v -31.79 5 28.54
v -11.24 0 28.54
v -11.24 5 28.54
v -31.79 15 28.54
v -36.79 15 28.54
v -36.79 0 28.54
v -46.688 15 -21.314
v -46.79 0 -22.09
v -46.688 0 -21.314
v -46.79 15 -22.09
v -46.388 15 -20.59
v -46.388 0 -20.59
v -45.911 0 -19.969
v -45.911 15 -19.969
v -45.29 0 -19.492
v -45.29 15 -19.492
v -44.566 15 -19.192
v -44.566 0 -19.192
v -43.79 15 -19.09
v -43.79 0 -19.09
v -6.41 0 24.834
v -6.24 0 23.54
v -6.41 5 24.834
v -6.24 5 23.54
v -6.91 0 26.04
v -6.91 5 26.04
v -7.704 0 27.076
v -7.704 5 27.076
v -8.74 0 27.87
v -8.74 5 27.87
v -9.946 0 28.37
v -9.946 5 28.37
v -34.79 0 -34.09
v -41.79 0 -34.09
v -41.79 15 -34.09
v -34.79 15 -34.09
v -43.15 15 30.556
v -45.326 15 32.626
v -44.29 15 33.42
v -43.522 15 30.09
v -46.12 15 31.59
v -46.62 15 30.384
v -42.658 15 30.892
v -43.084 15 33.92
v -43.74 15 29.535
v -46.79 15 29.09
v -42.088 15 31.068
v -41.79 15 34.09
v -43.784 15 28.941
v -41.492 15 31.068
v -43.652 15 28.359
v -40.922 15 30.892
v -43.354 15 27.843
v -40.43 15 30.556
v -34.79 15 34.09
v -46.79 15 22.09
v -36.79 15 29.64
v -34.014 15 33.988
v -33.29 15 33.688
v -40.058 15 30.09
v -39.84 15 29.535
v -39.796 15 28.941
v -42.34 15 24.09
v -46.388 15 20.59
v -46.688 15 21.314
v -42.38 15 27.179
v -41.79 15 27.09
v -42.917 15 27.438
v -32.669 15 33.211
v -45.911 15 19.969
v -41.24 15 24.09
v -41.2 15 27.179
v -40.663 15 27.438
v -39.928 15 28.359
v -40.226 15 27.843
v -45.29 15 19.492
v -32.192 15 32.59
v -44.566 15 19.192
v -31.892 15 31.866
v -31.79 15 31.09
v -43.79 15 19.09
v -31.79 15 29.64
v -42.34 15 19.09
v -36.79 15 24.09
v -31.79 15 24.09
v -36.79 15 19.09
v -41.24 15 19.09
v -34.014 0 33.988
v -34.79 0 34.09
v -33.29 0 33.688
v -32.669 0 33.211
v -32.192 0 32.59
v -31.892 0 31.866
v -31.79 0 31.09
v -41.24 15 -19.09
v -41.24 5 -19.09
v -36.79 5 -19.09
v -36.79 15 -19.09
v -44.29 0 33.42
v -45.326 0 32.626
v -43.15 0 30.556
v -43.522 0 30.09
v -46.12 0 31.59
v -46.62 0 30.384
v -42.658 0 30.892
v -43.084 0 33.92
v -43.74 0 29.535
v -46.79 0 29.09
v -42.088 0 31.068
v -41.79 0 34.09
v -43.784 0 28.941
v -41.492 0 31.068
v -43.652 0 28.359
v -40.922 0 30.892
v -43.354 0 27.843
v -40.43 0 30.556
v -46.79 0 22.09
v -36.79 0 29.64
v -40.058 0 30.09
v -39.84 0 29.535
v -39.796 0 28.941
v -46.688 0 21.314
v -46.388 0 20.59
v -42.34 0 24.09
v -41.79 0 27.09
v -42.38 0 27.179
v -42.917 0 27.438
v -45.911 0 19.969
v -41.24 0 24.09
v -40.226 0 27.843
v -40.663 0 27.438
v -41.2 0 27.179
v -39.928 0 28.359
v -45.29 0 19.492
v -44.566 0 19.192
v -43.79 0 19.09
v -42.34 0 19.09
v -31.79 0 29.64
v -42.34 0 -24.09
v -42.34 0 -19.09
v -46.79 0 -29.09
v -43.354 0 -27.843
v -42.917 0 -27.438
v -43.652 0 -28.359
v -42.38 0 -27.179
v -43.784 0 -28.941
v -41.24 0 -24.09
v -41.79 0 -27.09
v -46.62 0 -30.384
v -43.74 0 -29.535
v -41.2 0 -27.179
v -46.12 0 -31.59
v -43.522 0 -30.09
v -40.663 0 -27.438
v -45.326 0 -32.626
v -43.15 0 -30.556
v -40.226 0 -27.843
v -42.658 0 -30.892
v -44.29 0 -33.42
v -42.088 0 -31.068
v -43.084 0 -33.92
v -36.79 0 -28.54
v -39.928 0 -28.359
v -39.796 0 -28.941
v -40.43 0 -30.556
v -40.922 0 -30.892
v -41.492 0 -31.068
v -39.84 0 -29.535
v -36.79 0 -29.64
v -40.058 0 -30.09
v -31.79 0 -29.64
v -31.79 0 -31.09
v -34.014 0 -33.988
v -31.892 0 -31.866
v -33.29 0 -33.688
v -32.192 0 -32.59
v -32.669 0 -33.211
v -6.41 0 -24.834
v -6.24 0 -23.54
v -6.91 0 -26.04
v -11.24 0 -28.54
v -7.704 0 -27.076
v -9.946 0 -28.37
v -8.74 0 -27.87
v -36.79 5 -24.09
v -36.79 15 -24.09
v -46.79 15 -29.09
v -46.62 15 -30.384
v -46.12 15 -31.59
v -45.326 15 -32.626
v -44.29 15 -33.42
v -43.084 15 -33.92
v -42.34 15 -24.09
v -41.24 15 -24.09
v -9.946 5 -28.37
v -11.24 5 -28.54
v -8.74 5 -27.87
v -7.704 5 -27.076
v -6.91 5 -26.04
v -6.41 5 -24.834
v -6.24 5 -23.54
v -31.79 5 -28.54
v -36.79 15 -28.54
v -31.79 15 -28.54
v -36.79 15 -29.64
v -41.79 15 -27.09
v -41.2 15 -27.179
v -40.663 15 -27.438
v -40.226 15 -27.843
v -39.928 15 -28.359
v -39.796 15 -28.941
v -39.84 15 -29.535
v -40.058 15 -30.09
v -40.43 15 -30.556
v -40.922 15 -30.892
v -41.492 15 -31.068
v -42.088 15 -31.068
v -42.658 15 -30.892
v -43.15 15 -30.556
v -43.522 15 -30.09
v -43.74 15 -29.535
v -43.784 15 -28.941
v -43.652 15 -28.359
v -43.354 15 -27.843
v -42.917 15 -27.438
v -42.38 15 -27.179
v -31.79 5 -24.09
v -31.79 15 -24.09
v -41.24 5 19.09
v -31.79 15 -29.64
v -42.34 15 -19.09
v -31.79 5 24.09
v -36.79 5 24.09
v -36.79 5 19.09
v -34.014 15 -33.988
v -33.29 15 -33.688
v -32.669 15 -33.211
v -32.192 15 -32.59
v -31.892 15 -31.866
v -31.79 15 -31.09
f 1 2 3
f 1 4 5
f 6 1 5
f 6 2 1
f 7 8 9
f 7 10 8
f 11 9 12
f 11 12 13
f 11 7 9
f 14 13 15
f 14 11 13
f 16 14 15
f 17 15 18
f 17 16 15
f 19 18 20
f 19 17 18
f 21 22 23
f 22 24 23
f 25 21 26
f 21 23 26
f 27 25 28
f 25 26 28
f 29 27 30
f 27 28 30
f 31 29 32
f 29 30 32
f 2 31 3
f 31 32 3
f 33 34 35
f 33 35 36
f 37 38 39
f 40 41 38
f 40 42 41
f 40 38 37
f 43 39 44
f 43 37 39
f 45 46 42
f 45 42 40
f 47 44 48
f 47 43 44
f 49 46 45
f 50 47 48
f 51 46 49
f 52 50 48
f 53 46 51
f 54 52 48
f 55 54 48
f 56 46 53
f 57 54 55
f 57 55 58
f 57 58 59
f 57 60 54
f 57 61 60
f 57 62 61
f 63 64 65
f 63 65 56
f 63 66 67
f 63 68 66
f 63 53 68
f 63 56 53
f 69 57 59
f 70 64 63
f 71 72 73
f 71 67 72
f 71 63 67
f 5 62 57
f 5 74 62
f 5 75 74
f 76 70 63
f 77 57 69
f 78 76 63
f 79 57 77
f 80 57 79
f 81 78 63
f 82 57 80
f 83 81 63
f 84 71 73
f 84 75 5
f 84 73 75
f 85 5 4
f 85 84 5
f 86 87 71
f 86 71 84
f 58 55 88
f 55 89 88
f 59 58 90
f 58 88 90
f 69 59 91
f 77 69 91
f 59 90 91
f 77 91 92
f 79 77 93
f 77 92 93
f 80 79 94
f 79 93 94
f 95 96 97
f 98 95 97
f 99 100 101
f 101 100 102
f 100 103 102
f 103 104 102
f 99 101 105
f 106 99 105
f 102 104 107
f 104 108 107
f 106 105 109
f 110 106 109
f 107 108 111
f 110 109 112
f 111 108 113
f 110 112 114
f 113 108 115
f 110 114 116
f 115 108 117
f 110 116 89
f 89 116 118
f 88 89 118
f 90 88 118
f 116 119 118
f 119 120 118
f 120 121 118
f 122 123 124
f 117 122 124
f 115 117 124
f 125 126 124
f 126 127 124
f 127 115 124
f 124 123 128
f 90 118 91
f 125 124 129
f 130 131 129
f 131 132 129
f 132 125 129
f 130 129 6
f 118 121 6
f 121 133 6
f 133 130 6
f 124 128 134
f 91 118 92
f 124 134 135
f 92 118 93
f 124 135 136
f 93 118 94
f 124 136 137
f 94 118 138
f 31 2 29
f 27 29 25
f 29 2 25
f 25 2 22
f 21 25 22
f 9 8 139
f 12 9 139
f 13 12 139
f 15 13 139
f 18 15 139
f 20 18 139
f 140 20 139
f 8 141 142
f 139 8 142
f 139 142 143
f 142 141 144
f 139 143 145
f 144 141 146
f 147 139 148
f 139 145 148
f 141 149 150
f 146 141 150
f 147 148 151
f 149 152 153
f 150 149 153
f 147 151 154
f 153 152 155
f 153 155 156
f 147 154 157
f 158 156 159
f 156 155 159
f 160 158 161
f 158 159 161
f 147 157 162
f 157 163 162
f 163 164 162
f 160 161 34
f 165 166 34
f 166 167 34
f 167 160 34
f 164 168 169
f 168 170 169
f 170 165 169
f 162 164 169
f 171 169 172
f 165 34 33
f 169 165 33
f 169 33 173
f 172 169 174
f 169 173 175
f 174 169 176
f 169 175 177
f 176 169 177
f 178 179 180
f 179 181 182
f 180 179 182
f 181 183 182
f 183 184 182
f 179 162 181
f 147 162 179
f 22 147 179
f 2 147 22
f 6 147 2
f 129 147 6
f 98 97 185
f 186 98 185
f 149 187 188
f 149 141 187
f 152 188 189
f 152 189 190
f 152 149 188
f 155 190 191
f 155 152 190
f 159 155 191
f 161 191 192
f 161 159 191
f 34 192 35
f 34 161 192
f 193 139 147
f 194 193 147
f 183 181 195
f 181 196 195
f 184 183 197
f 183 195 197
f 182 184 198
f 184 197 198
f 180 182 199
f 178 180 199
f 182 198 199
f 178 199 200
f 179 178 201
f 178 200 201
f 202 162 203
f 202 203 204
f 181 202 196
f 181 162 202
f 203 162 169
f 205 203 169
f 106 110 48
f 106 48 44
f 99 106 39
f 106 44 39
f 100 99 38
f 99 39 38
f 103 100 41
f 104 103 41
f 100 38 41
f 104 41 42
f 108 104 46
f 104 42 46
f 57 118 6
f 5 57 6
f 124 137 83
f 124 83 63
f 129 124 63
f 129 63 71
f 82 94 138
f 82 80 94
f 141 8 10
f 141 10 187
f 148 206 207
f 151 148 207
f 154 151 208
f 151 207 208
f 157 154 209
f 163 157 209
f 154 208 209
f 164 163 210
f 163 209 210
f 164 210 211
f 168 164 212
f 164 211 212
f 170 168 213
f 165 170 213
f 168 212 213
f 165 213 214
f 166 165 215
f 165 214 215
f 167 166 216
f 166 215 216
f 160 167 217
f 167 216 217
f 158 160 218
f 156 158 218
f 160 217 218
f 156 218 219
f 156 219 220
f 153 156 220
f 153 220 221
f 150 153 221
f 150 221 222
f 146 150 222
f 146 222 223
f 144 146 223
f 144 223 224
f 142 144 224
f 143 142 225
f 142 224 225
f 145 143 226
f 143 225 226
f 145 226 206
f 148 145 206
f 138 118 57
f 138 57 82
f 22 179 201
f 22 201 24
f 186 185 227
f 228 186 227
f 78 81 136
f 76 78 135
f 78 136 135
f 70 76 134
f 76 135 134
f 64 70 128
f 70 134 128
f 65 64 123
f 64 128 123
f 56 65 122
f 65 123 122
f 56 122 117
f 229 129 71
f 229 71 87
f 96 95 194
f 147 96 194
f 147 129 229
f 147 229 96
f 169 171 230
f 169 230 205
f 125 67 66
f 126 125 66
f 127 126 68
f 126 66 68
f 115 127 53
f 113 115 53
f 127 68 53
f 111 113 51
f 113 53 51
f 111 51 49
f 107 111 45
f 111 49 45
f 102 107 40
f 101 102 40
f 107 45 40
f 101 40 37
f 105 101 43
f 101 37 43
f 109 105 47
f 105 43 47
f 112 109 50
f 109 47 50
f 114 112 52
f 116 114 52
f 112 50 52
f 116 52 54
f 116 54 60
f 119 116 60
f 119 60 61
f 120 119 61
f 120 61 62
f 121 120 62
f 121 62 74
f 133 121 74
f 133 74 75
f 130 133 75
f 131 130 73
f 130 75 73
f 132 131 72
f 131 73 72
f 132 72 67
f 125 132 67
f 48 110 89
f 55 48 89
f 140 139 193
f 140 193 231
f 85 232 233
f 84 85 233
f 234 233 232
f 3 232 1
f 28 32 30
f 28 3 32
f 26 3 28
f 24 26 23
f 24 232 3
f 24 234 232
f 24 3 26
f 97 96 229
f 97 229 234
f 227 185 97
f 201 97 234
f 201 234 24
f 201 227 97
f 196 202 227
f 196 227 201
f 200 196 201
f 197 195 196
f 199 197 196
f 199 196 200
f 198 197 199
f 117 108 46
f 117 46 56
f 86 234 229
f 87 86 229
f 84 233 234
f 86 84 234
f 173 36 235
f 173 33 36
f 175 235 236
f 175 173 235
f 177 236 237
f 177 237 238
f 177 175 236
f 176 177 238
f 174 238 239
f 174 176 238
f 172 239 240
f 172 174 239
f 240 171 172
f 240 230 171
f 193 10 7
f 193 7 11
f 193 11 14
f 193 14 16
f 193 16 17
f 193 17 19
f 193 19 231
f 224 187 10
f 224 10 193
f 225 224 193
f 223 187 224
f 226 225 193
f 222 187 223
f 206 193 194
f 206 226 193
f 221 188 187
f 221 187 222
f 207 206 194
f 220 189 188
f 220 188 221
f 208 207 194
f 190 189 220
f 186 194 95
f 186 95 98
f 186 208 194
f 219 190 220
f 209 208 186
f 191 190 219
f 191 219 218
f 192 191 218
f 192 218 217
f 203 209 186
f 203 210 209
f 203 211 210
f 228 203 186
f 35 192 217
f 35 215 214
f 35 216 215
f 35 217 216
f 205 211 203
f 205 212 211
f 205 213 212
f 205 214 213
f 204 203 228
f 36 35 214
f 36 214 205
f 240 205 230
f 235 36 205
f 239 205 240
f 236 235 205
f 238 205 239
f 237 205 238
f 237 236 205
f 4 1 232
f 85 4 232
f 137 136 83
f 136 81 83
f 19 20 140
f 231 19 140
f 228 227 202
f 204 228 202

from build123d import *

# Parameters (mm, degrees)
SKETCH2_W          = 93.58
SKETCH2_H          = 68.18
BASE_DEPTH         = 5
SKETCH2_7_W        = 4.45
SKETCH2_7_H        = 4.45
SKETCH2_7_H_2      = 5
SKETCH2_7_W_2      = 5
SKETCH2_7_H_3      = 1.1
SKETCH2_7_W_3      = 1.1
WALLS_DEPTH        = 15
SKETCH2_10_W       = 1.1
SKETCH2_10_H       = 5
SKETCH2_10_H_2     = 38.18
SKETCH2_10_W_2     = 5
SKETCH2_10_H_3     = 1.1
SKETCH2_10_W_3     = 63.58
ACRYLIC_CUT_DEPTH  = 60.803279174
SKETCH4_W          = 63.58
SKETCH4_H          = 4.45
SKETCH4_W_2        = 4.45
SKETCH4_H_2        = 38.18
CUT_EXTRUDE2_DEPTH = 5
SKETCH5_R          = 2.25
SCREW_HOLES_DEPTH  = 5
FILLET1_R          = 5
FILLET2_R          = 3
SKETCH8_R          = 2
CUT_EXTRUDE3_DEPTH = 15
SKETCH7_W          = 13.03
SKETCH7_H          = 57.08
SKETCH7_W_2        = 40
SKETCH7_H_2        = 68.18
TOP_CUT_DEPTH      = 60.803279174
FILLET4_R          = 5


with BuildPart() as part:
    # Sketch2 → Base (new body)
    with BuildSketch(Plane(origin=(0, 0, 0), x_dir=(1, 0, 0), z_dir=(0, 1, 0))):
        Rectangle(SKETCH2_W, SKETCH2_H)
    extrude(amount=BASE_DEPTH)

    # Sketch2<7> → Walls (add)
    with BuildSketch(Plane(origin=(0, 0, 0), x_dir=(1, 0, 0), z_dir=(0, 1, 0))):
        with Locations((-39.015, 26.315)):
            Rectangle(SKETCH2_7_W, SKETCH2_7_H)
        with Locations((-39.015, 21.59)):
            Rectangle(SKETCH2_7_W, SKETCH2_7_H_2)
        with Locations((-44.565, 21.59)):
            Rectangle(SKETCH2_7_W, SKETCH2_7_H_2)
        with Locations((-44.565, 26.315)):
            Rectangle(SKETCH2_7_W, SKETCH2_7_H)
        with Locations((-44.565, 31.865)):
            Rectangle(SKETCH2_7_W, SKETCH2_7_H)
        with Locations((-39.015, 31.865)):
            Rectangle(SKETCH2_7_W, SKETCH2_7_H)
        with Locations((-34.29, 31.865)):
            Rectangle(SKETCH2_7_W_2, SKETCH2_7_H)
        with Locations((-34.29, 26.315)):
            Rectangle(SKETCH2_7_W_2, SKETCH2_7_H)
        with Locations((-34.29, 29.09)):
            Rectangle(SKETCH2_7_W_2, SKETCH2_7_H_3)
        with Locations((-39.015, 29.09)):
            Rectangle(SKETCH2_7_W, SKETCH2_7_H_3)
        with Locations((-44.565, 29.09)):
            Rectangle(SKETCH2_7_W, SKETCH2_7_H_3)
        with Locations((-41.79, 31.865)):
            Rectangle(SKETCH2_7_W_3, SKETCH2_7_H)
        with Locations((-41.79, 26.315)):
            Rectangle(SKETCH2_7_W_3, SKETCH2_7_H)
        with Locations((-41.79, 29.09)):
            Rectangle(SKETCH2_7_W_3, SKETCH2_7_H_3)
        with Locations((-41.79, 21.59)):
            Rectangle(SKETCH2_7_W_3, SKETCH2_7_H_2)
        with Locations((-34.29, -26.315)):
            Rectangle(SKETCH2_7_W_2, SKETCH2_7_H)
        with Locations((-34.29, -31.865)):
            Rectangle(SKETCH2_7_W_2, SKETCH2_7_H)
        with Locations((-39.015, -31.865)):
            Rectangle(SKETCH2_7_W, SKETCH2_7_H)
        with Locations((-39.015, -26.315)):
            Rectangle(SKETCH2_7_W, SKETCH2_7_H)
        with Locations((-44.565, -26.315)):
            Rectangle(SKETCH2_7_W, SKETCH2_7_H)
        with Locations((-44.565, -31.865)):
            Rectangle(SKETCH2_7_W, SKETCH2_7_H)
        with Locations((-44.565, -29.09)):
            Rectangle(SKETCH2_7_W, SKETCH2_7_H_3)
        with Locations((-41.79, -31.865)):
            Rectangle(SKETCH2_7_W_3, SKETCH2_7_H)
        with Locations((-41.79, -29.09)):
            Rectangle(SKETCH2_7_W_3, SKETCH2_7_H_3)
        with Locations((-41.79, -26.315)):
            Rectangle(SKETCH2_7_W_3, SKETCH2_7_H)
        with Locations((-44.565, -21.59)):
            Rectangle(SKETCH2_7_W, SKETCH2_7_H_2)
        with Locations((-39.015, -21.59)):
            Rectangle(SKETCH2_7_W, SKETCH2_7_H_2)
        with Locations((-41.79, -21.59)):
            Rectangle(SKETCH2_7_W_3, SKETCH2_7_H_2)
        with Locations((-39.015, -29.09)):
            Rectangle(SKETCH2_7_W, SKETCH2_7_H_3)
        with Locations((-34.29, -29.09)):
            Rectangle(SKETCH2_7_W_2, SKETCH2_7_H_3)
        with Locations((39.015, -21.59)):
            Rectangle(SKETCH2_7_W, SKETCH2_7_H_2)
        with Locations((44.565, -21.59)):
            Rectangle(SKETCH2_7_W, SKETCH2_7_H_2)
        with Locations((44.565, -26.315)):
            Rectangle(SKETCH2_7_W, SKETCH2_7_H)
        with Locations((39.015, -26.315)):
            Rectangle(SKETCH2_7_W, SKETCH2_7_H)
        with Locations((34.29, -31.865)):
            Rectangle(SKETCH2_7_W_2, SKETCH2_7_H)
        with Locations((39.015, -31.865)):
            Rectangle(SKETCH2_7_W, SKETCH2_7_H)
        with Locations((44.565, -31.865)):
            Rectangle(SKETCH2_7_W, SKETCH2_7_H)
        with Locations((41.79, -31.865)):
            Rectangle(SKETCH2_7_W_3, SKETCH2_7_H)
        with Locations((44.565, -29.09)):
            Rectangle(SKETCH2_7_W, SKETCH2_7_H_3)
        with Locations((41.79, -26.315)):
            Rectangle(SKETCH2_7_W_3, SKETCH2_7_H)
        with Locations((41.79, -21.59)):
            Rectangle(SKETCH2_7_W_3, SKETCH2_7_H_2)
        with Locations((34.29, -26.315)):
            Rectangle(SKETCH2_7_W_2, SKETCH2_7_H)
        with Locations((34.29, -29.09)):
            Rectangle(SKETCH2_7_W_2, SKETCH2_7_H_3)
        with Locations((39.015, -29.09)):
            Rectangle(SKETCH2_7_W, SKETCH2_7_H_3)
        with Locations((41.79, -29.09)):
            Rectangle(SKETCH2_7_W_3, SKETCH2_7_H_3)
        with Locations((34.29, 26.315)):
            Rectangle(SKETCH2_7_W_2, SKETCH2_7_H)
        with Locations((34.29, 31.865)):
            Rectangle(SKETCH2_7_W_2, SKETCH2_7_H)
        with Locations((39.015, 31.865)):
            Rectangle(SKETCH2_7_W, SKETCH2_7_H)
        with Locations((39.015, 26.315)):
            Rectangle(SKETCH2_7_W, SKETCH2_7_H)
        with Locations((44.565, 26.315)):
            Rectangle(SKETCH2_7_W, SKETCH2_7_H)
        with Locations((44.565, 31.865)):
            Rectangle(SKETCH2_7_W, SKETCH2_7_H)
        with Locations((44.565, 21.59)):
            Rectangle(SKETCH2_7_W, SKETCH2_7_H_2)
        with Locations((39.015, 21.59)):
            Rectangle(SKETCH2_7_W, SKETCH2_7_H_2)
        with Locations((41.79, 21.59)):
            Rectangle(SKETCH2_7_W_3, SKETCH2_7_H_2)
        with Locations((41.79, 26.315)):
            Rectangle(SKETCH2_7_W_3, SKETCH2_7_H)
        with Locations((41.79, 31.865)):
            Rectangle(SKETCH2_7_W_3, SKETCH2_7_H)
        with Locations((44.565, 29.09)):
            Rectangle(SKETCH2_7_W, SKETCH2_7_H_3)
        with Locations((41.79, 29.09)):
            Rectangle(SKETCH2_7_W_3, SKETCH2_7_H_3)
        with Locations((39.015, 29.09)):
            Rectangle(SKETCH2_7_W, SKETCH2_7_H_3)
        with Locations((34.29, 29.09)):
            Rectangle(SKETCH2_7_W_2, SKETCH2_7_H_3)
    extrude(amount=WALLS_DEPTH)

    # Sketch2<10> → Acrylic Cut (cut, through all)
    with BuildSketch(Plane(origin=(0, 0, 0), x_dir=(1, 0, 0), z_dir=(0, 1, 0))):
        with Locations((41.79, -21.59)):
            Rectangle(SKETCH2_10_W, SKETCH2_10_H)
        with Locations((41.79, 0)):
            Rectangle(SKETCH2_10_W, SKETCH2_10_H_2)
        with Locations((34.29, -29.09)):
            Rectangle(SKETCH2_10_W_2, SKETCH2_10_H_3)
        with Locations((0, -29.09)):
            Rectangle(SKETCH2_10_W_3, SKETCH2_10_H_3)
        with Locations((41.79, 21.59)):
            Rectangle(SKETCH2_10_W, SKETCH2_10_H)
        with Locations((34.29, 29.09)):
            Rectangle(SKETCH2_10_W_2, SKETCH2_10_H_3)
        with Locations((0, 29.09)):
            Rectangle(SKETCH2_10_W_3, SKETCH2_10_H_3)
        with Locations((-34.29, 29.09)):
            Rectangle(SKETCH2_10_W_2, SKETCH2_10_H_3)
        with Locations((-41.79, 21.59)):
            Rectangle(SKETCH2_10_W, SKETCH2_10_H)
        with Locations((-41.79, 0)):
            Rectangle(SKETCH2_10_W, SKETCH2_10_H_2)
        with Locations((-41.79, -21.59)):
            Rectangle(SKETCH2_10_W, SKETCH2_10_H)
        with Locations((-34.29, -29.09)):
            Rectangle(SKETCH2_10_W_2, SKETCH2_10_H_3)
    extrude(amount=ACRYLIC_CUT_DEPTH, mode=Mode.SUBTRACT)

    # Sketch4 → Cut-Extrude2 (cut)
    with BuildSketch(Plane(origin=(0, 5, 0), x_dir=(1, 0, 0), z_dir=(0, 1, 0))):
        with Locations((0, -31.865)):
            Rectangle(SKETCH4_W, SKETCH4_H)
        with Locations((44.565, 0)):
            Rectangle(SKETCH4_W_2, SKETCH4_H_2)
        with Locations((0, 31.865)):
            Rectangle(SKETCH4_W, SKETCH4_H)
        with Locations((-44.565, 0)):
            Rectangle(SKETCH4_W_2, SKETCH4_H_2)
    extrude(amount=-CUT_EXTRUDE2_DEPTH, mode=Mode.SUBTRACT)

    # Sketch5 → Screw Holes (add)
    with BuildSketch(Plane(origin=(0, 5, 0), x_dir=(1, 0, 0), z_dir=(0, 1, 0))):
        with Locations(Location((36.79, -10.16, 0), (0, 0, 90))):
            Circle(SKETCH5_R)
        with Locations(Location((16.79, -10.16, 0), (0, 0, 90))):
            Circle(SKETCH5_R)
        with Locations(Location((26.79, 19.64, 0), (0, 0, 90))):
            Circle(SKETCH5_R)
    extrude(amount=SCREW_HOLES_DEPTH)

    # Fillet1
    fillet1_edges = [part.edges().sort_by_distance(p)[0] for p in [
        (-46.79, 7.5, 34.09),
        (46.79, 7.5, 34.09),
        (46.79, 7.5, -34.09),
        (-46.79, 7.5, -34.09),
    ]]
    fillet(fillet1_edges, radius=FILLET1_R)

    # Fillet2
    fillet2_edges = [part.edges().sort_by_distance(p)[0] for p in [
        (31.79, 7.5, -34.09),
        (46.79, 7.5, -19.09),
        (-46.79, 7.5, -19.09),
        (-31.79, 7.5, -34.09),
        (-46.79, 7.5, 19.09),
        (-31.79, 7.5, 34.09),
        (31.79, 7.5, 34.09),
        (46.79, 7.5, 19.09),
    ]]
    fillet(fillet2_edges, radius=FILLET2_R)

    # Sketch8 → Cut-Extrude3 (cut)
    with BuildSketch(Plane(origin=(0, 15, 0), x_dir=(1, 0, 0), z_dir=(0, 1, 0))):
        with Locations(Location((41.79, -29.09, 0), (0, 0, 270))):
            Circle(SKETCH8_R)
        with Locations(Location((-41.79, -29.09, 0), (0, 0, 90))):
            Circle(SKETCH8_R)
        with Locations(Location((-41.79, 29.09, 0), (0, 0, 270))):
            Circle(SKETCH8_R)
        with Locations(Location((41.79, 29.09, 0), (0, 0, 90))):
            Circle(SKETCH8_R)
    extrude(amount=-CUT_EXTRUDE3_DEPTH, mode=Mode.SUBTRACT)

    # Sketch7 → Top Cut (cut, through all)
    with BuildSketch(Plane.XZ):
        with Locations((0.275, 0)):
            Rectangle(SKETCH7_W, SKETCH7_H)
        with Locations((26.79, 0)):
            Rectangle(SKETCH7_W_2, SKETCH7_H_2)
    extrude(amount=-TOP_CUT_DEPTH, mode=Mode.SUBTRACT)

    # Fillet4
    fillet4_edges = [part.edges().sort_by_distance(p)[0] for p in [
        (-6.24, 2.5, 28.54),
        (-6.24, 2.5, -28.54),
    ]]
    fillet(fillet4_edges, radius=FILLET4_R)


solid = part.part
